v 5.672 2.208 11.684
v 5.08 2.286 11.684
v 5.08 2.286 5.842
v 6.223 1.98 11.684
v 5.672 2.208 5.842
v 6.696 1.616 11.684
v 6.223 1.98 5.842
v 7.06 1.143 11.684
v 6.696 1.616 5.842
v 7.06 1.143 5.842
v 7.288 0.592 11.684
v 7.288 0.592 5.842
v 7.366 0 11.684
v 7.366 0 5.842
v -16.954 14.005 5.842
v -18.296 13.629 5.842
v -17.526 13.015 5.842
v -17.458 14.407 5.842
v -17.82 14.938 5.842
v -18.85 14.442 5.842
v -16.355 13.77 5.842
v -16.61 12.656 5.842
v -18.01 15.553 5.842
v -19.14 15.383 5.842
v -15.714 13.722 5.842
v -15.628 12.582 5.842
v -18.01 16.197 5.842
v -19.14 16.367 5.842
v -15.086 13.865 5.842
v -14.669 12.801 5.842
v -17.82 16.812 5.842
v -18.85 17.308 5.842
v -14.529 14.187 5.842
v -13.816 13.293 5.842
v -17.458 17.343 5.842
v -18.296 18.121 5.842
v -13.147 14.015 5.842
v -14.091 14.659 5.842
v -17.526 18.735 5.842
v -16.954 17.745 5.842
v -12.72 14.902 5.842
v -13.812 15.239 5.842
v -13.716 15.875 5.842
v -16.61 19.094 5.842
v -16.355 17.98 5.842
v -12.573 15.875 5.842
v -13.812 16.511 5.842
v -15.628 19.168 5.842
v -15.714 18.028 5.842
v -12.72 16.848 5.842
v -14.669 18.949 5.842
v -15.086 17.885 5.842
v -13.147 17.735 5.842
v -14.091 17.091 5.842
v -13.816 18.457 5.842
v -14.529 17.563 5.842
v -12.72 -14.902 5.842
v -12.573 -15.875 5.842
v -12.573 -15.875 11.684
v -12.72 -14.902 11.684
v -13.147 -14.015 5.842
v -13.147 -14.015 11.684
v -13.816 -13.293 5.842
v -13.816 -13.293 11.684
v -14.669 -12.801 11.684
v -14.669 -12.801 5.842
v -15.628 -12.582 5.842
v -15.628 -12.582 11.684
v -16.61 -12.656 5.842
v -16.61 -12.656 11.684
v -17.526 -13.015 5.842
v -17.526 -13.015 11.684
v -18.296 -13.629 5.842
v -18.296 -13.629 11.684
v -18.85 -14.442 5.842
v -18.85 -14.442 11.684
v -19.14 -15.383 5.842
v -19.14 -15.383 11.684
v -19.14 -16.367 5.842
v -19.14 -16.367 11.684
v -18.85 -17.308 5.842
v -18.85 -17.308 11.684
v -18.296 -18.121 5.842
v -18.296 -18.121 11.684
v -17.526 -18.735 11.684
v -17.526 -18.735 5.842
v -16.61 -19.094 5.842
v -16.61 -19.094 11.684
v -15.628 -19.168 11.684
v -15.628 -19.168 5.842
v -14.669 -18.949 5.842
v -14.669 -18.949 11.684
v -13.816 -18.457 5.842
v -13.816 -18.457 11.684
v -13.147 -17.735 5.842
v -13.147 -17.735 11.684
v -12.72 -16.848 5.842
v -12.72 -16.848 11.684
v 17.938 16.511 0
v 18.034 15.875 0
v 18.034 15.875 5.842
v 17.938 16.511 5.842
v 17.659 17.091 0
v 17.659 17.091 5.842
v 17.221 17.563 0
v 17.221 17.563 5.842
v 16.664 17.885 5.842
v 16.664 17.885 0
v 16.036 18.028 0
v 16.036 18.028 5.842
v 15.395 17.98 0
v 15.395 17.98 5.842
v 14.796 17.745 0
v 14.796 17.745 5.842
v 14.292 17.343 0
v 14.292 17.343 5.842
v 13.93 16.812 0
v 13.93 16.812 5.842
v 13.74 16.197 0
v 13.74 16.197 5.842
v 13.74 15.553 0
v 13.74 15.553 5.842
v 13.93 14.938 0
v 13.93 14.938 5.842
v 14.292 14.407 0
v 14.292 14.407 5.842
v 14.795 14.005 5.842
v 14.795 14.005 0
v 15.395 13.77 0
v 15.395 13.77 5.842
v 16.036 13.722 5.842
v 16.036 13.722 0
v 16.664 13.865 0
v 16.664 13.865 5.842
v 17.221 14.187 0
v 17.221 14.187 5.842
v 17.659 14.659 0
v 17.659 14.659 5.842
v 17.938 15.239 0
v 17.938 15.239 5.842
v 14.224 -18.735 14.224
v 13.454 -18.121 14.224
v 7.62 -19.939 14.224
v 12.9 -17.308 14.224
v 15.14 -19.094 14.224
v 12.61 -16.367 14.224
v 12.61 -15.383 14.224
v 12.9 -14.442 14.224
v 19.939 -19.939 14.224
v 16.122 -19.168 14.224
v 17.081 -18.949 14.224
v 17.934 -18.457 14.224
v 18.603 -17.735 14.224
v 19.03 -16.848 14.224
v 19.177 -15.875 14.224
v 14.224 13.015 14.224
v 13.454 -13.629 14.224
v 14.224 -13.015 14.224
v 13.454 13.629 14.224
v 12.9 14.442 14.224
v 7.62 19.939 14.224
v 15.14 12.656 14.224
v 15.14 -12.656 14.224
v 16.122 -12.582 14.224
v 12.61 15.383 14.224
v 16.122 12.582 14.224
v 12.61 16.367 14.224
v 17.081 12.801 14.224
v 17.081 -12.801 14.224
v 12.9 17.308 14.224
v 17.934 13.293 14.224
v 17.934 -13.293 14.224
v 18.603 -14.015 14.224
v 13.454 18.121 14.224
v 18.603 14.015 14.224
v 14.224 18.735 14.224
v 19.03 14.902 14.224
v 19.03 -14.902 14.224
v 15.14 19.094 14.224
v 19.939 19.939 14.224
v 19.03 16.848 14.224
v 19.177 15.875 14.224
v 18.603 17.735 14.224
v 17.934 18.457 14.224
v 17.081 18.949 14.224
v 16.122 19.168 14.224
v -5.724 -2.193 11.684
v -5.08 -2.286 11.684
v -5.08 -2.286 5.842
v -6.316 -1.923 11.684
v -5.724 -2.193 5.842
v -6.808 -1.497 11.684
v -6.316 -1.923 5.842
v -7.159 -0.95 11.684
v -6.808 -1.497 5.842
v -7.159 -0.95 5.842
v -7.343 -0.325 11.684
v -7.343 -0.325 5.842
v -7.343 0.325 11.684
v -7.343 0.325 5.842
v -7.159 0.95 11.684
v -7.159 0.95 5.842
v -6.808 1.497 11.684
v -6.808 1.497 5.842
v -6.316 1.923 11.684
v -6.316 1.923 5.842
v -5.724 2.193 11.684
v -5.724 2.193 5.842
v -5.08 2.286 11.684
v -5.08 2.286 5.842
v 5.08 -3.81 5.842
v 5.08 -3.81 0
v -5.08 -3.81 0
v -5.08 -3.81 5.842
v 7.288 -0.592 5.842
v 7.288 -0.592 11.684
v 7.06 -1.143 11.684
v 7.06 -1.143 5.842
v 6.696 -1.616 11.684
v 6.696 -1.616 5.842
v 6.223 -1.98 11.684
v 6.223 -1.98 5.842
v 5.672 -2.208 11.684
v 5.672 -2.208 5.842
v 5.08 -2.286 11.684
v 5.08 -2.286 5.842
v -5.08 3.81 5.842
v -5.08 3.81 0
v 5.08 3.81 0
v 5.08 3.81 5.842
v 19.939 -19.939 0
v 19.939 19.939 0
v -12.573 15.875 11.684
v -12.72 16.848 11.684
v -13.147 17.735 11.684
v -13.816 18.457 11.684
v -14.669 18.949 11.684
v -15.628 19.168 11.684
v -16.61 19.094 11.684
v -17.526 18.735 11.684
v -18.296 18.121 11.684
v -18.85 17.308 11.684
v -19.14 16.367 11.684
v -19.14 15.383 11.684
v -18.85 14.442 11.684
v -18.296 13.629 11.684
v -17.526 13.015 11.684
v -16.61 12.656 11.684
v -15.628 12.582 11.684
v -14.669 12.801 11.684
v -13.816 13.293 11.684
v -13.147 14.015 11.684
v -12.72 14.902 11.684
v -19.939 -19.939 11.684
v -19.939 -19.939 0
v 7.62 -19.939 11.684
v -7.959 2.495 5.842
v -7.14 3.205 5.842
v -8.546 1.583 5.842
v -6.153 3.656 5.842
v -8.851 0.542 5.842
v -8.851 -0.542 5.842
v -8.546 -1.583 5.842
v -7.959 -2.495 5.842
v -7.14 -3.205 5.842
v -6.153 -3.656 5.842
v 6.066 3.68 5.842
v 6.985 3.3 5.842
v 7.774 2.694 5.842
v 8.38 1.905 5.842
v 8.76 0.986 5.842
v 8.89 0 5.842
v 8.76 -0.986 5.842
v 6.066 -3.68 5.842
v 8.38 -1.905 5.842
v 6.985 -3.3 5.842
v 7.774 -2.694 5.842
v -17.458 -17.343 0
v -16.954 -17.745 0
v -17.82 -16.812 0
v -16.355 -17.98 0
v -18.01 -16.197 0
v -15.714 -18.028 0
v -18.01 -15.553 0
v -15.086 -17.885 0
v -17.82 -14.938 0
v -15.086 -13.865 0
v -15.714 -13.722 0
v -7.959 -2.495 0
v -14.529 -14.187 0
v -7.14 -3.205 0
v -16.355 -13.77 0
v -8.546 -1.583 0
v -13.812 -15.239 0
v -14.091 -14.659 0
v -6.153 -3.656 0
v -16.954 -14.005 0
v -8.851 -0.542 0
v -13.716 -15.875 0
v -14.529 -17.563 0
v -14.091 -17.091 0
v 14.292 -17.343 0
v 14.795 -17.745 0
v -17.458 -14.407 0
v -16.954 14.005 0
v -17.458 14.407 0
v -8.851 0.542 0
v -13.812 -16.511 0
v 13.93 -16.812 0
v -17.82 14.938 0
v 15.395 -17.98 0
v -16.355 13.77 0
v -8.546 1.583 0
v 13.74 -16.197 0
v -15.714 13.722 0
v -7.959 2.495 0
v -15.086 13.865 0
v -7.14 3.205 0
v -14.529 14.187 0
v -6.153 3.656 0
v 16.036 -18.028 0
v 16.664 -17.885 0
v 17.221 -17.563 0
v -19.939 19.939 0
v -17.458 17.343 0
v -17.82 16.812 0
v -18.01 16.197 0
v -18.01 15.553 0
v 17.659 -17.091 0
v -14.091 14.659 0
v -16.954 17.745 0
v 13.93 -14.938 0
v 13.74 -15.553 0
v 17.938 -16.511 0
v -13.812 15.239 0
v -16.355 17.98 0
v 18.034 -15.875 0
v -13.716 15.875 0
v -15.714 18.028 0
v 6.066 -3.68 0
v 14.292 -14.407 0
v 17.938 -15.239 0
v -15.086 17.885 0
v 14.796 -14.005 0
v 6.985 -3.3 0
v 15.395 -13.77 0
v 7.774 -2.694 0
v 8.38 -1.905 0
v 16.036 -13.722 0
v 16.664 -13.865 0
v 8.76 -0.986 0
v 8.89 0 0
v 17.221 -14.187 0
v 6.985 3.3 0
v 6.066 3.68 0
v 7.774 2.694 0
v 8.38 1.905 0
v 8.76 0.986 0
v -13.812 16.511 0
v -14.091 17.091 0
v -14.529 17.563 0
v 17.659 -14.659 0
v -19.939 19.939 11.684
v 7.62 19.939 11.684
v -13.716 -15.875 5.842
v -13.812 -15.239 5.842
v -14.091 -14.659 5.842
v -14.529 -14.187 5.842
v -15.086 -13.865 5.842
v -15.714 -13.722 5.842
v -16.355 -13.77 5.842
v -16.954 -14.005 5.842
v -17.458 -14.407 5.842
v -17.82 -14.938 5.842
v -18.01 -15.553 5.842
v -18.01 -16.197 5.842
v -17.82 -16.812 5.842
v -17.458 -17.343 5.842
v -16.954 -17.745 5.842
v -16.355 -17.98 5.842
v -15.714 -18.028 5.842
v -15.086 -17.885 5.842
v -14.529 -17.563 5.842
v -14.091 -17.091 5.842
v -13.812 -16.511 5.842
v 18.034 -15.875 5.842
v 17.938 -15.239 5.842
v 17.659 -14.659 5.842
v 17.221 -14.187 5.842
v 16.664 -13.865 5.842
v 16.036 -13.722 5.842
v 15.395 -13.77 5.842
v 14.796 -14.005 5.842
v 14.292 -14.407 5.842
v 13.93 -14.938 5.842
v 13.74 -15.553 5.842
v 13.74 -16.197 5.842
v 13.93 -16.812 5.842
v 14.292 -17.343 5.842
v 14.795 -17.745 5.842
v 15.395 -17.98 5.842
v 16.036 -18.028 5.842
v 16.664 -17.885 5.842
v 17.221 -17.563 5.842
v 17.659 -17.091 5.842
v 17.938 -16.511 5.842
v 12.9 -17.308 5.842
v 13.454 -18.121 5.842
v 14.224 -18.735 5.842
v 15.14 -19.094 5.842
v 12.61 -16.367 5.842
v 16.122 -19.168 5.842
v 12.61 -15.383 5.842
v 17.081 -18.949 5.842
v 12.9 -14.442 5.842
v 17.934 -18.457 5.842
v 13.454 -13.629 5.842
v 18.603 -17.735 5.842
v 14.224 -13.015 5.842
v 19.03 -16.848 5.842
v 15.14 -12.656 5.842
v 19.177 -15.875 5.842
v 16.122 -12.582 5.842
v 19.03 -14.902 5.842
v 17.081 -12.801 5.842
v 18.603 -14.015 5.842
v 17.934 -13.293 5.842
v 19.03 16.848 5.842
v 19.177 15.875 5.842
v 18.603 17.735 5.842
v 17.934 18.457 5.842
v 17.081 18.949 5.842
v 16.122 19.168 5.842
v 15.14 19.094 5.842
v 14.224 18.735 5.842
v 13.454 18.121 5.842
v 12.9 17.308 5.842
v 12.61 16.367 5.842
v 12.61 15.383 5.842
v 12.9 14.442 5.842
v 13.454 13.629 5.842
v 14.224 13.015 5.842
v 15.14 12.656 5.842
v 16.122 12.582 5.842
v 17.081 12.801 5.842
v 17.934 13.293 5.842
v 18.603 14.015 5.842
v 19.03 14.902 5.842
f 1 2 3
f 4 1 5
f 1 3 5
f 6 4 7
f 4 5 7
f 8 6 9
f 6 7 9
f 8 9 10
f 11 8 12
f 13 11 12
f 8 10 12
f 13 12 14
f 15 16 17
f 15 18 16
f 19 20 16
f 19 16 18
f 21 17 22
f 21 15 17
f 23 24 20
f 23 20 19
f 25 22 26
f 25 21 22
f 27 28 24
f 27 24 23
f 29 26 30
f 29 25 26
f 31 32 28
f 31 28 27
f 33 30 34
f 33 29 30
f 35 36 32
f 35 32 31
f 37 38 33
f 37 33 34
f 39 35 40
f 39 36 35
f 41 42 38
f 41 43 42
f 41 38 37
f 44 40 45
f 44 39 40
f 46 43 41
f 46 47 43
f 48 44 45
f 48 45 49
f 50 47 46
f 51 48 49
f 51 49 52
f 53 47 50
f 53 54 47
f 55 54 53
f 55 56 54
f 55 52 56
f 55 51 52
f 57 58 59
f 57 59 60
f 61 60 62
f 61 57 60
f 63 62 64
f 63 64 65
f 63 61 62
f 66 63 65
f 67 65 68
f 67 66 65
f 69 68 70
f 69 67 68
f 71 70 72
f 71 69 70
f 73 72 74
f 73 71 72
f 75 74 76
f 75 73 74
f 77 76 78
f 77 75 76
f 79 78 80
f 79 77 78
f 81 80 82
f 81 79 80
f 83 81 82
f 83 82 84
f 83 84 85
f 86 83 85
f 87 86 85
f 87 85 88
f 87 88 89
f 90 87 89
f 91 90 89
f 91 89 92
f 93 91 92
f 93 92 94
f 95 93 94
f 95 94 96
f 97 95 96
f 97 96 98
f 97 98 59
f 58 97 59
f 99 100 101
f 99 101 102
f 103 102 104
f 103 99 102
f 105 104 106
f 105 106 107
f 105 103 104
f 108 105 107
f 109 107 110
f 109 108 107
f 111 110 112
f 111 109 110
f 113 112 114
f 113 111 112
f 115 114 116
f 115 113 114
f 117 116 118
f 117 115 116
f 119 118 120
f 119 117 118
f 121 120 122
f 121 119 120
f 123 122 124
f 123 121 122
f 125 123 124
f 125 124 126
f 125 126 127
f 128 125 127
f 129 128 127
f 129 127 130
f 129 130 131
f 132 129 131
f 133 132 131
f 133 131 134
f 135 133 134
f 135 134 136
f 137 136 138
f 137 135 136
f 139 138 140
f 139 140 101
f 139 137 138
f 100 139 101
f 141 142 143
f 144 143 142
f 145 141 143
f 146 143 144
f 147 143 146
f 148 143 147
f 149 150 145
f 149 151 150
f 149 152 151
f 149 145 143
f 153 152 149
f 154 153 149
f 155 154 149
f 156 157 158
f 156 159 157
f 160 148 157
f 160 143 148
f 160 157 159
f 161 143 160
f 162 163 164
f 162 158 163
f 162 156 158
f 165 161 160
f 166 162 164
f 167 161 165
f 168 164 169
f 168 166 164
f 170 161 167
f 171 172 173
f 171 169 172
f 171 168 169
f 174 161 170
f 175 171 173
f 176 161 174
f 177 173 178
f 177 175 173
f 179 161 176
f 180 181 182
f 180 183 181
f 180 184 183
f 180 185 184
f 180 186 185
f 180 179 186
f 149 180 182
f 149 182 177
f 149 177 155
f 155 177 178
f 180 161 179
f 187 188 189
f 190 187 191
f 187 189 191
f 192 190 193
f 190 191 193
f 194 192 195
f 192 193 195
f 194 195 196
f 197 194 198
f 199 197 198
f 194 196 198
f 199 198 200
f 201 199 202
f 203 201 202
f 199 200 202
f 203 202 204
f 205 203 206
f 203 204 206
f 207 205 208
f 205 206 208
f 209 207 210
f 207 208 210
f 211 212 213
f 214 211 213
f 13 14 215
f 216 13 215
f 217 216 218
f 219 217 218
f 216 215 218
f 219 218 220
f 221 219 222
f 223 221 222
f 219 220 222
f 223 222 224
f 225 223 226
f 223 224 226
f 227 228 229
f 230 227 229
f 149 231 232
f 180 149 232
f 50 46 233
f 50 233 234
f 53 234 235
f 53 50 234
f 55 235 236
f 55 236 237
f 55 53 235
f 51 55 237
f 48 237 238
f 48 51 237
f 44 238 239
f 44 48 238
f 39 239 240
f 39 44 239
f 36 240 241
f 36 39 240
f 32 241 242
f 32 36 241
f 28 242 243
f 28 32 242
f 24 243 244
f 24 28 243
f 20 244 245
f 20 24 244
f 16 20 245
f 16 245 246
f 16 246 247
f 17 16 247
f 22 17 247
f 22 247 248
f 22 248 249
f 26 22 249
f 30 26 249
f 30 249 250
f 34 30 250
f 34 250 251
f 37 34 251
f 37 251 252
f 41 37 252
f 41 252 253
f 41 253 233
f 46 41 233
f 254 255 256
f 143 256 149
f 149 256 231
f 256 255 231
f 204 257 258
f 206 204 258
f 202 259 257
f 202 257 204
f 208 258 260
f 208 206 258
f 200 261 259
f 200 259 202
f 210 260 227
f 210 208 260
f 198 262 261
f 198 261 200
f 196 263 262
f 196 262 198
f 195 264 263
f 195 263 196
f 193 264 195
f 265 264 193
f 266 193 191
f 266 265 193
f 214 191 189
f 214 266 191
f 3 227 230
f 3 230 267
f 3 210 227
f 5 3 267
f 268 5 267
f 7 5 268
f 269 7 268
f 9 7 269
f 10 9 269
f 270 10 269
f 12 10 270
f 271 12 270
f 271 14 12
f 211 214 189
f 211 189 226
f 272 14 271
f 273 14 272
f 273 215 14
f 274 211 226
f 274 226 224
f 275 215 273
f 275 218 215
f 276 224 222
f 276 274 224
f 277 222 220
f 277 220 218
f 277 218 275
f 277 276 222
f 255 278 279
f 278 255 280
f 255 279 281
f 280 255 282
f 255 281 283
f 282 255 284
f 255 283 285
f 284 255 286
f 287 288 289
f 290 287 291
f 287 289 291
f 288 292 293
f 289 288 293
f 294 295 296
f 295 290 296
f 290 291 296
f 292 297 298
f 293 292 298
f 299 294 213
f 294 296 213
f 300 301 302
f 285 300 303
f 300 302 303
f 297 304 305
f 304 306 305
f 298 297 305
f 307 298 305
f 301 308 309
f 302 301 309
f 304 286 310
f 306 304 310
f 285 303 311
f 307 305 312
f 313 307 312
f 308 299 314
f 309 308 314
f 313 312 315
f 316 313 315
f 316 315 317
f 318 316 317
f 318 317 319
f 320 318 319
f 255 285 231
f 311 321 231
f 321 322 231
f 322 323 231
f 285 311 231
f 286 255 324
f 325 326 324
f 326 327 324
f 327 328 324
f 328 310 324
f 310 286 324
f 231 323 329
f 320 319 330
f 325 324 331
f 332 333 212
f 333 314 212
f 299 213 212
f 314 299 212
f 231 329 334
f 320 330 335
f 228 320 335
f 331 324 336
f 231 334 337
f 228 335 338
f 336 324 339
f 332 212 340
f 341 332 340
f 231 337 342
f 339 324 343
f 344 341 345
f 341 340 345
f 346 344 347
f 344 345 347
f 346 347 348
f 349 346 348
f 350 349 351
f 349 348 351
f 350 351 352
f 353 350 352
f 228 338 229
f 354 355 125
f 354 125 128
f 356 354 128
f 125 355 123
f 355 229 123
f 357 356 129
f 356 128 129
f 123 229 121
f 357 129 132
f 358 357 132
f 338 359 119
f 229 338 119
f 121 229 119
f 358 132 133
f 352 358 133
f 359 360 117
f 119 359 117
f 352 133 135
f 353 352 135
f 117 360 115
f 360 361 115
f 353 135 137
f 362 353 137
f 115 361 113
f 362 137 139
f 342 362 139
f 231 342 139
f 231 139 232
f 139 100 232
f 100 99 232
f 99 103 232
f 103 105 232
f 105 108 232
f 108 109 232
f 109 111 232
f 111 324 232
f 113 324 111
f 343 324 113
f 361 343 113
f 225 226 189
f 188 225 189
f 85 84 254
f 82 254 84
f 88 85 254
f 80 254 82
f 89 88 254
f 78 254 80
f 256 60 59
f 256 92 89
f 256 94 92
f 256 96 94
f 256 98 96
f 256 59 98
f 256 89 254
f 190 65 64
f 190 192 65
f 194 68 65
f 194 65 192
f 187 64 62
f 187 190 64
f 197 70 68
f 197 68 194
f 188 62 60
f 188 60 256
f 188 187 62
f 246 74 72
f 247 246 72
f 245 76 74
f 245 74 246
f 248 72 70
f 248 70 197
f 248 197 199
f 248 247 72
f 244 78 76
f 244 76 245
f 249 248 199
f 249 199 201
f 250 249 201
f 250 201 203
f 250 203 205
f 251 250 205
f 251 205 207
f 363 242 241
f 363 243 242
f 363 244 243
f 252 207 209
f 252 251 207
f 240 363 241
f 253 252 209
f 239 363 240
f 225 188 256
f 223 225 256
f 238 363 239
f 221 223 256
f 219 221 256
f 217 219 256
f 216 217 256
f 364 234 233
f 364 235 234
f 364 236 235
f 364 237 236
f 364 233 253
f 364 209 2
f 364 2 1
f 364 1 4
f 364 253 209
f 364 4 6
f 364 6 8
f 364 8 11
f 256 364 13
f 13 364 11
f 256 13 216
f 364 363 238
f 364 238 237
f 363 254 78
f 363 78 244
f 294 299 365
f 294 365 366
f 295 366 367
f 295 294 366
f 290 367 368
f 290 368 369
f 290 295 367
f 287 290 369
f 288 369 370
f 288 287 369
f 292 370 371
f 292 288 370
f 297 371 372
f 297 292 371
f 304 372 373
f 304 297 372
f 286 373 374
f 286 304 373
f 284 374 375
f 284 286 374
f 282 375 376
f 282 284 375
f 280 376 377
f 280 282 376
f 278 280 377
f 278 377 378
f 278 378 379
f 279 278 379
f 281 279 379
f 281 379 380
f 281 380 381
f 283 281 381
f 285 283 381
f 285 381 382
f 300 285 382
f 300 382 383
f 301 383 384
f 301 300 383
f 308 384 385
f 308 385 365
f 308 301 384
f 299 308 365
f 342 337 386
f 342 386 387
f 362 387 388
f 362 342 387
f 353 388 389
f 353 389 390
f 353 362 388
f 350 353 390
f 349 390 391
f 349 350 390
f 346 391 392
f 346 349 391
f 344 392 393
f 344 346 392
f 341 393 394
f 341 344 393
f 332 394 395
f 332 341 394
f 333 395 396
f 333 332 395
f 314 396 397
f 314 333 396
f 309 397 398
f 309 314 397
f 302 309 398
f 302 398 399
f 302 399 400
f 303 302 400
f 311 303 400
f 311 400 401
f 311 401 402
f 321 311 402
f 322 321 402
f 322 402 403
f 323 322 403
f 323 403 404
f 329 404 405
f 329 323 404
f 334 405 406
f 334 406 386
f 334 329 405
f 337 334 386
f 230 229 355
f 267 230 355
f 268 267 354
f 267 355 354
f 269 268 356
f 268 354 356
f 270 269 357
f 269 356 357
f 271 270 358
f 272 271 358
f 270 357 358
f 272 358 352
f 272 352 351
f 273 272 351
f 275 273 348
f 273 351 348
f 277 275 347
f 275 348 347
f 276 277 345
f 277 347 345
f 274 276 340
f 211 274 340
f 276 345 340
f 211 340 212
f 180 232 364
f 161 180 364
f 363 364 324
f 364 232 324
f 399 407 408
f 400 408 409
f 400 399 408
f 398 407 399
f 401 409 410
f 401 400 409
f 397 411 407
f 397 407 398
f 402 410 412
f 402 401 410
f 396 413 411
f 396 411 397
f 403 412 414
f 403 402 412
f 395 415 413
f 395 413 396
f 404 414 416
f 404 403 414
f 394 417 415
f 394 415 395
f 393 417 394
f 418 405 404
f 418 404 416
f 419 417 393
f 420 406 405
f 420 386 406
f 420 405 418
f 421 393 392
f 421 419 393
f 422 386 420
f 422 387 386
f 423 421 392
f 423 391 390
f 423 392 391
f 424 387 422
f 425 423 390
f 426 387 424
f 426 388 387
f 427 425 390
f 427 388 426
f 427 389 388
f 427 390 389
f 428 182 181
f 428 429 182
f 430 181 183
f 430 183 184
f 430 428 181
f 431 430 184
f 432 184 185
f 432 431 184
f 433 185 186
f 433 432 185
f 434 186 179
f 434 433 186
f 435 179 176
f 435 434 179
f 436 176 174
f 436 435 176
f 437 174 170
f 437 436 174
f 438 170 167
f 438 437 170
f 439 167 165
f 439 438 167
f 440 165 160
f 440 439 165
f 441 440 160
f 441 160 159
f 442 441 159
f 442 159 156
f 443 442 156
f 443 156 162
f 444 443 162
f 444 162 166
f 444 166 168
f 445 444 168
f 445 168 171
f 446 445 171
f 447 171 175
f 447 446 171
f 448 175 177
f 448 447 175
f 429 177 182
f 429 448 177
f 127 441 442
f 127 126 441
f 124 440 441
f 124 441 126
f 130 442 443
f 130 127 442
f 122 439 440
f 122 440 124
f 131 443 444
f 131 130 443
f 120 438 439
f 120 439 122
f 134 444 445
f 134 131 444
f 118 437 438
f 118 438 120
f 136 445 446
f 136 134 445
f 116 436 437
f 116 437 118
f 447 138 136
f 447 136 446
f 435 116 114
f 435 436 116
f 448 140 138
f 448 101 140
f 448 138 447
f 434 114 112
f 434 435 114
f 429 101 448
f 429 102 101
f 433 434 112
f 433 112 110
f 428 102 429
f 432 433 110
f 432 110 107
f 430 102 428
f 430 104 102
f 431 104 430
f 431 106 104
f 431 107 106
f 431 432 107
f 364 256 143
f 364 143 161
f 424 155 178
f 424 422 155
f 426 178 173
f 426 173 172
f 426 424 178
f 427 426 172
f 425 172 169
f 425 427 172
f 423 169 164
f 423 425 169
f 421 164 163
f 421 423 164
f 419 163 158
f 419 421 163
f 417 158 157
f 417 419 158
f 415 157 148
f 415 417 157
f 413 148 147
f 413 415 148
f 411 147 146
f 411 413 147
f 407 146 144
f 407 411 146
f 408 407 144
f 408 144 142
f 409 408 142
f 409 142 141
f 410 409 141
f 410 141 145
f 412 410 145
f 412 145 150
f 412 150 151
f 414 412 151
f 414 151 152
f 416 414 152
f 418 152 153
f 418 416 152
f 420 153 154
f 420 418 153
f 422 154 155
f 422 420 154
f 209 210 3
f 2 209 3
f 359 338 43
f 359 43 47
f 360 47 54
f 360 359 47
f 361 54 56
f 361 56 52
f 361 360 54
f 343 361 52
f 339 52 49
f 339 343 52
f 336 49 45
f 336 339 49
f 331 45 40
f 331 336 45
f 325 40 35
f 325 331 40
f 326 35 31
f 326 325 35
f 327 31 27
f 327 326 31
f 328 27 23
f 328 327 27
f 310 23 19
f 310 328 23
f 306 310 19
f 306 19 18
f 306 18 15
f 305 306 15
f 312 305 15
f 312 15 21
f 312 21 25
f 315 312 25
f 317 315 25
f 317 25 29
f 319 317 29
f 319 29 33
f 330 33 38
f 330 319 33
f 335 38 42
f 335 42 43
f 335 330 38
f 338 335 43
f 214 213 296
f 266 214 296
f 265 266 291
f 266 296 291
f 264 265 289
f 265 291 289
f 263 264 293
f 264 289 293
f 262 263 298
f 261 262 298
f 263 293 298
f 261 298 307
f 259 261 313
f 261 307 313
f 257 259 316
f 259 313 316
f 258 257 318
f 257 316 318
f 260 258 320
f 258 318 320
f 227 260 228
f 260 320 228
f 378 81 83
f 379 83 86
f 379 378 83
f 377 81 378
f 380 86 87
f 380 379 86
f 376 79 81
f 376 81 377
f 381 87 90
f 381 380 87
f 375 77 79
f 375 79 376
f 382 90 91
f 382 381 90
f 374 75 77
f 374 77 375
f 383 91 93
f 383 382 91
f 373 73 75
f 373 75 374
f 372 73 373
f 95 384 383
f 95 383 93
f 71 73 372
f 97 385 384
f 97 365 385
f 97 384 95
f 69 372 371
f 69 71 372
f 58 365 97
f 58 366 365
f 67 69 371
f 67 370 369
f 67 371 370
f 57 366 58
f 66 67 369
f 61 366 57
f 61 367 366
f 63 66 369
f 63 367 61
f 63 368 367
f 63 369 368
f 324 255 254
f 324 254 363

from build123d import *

# Parameters (mm, degrees)
F0_W     = 12.319
F0_H     = 39.878
F0_R     = 3.302
F0_W_2   = 27.559
F1_DEPTH = 11.684
F0_R_2   = 2.159
F2_DEPTH = 5.842
F3_DEPTH = 14.224
F5_DEPTH = 25.4
F6_DEPTH = 5.842


# Not quite as in the source:
# - a feature names something its author has since deleted; it is built from what else it names


with BuildPart() as f1:
    # F0 (on Top) → F1 (new body)
    with BuildSketch(Plane.XY):
        with Locations((13.7795, 0)):
            Rectangle(F0_W, F0_H)
        with Locations((15.875, -15.875)):
            Circle(F0_R, mode=Mode.SUBTRACT)
        with Locations((15.875, 15.875)):
            Circle(F0_R, mode=Mode.SUBTRACT)
        with Locations((-6.1595, 0)):
            Rectangle(F0_W_2, F0_H)
        with Locations((-15.875, -15.875)):
            Circle(F0_R, mode=Mode.SUBTRACT)
        with Locations((-15.875, 15.875)):
            Circle(F0_R, mode=Mode.SUBTRACT)
    extrude(amount=F1_DEPTH)

    # F0 (on Top) → F2 (join)
    with BuildSketch(Plane.XY):
        with Locations((-15.875, 15.875)):
            Circle(F0_R)
        with Locations((-15.875, 15.875)):
            Circle(F0_R_2, mode=Mode.SUBTRACT)
        with Locations((15.875, 15.875)):
            Circle(F0_R)
        with Locations((15.875, 15.875)):
            Circle(F0_R_2, mode=Mode.SUBTRACT)
        with Locations((15.875, -15.875)):
            Circle(F0_R)
        with Locations((15.875, -15.875)):
            Circle(F0_R_2, mode=Mode.SUBTRACT)
        with Locations((-15.875, -15.875)):
            Circle(F0_R)
        with Locations((-15.875, -15.875)):
            Circle(F0_R_2, mode=Mode.SUBTRACT)
    extrude(amount=F2_DEPTH)

    # F0 (on Top) → F3 (join)
    with BuildSketch(Plane.XY):
        with Locations((13.7795, 0)):
            Rectangle(F0_W, F0_H)
        with Locations((15.875, -15.875)):
            Circle(F0_R, mode=Mode.SUBTRACT)
        with Locations((15.875, 15.875)):
            Circle(F0_R, mode=Mode.SUBTRACT)
    extrude(amount=F3_DEPTH)

    # F4 (on face) → F5 (cut)
    with BuildSketch(Plane(origin=(0, 0, 0), x_dir=(1, 0, 0), z_dir=(0, 0, -1))):
        with BuildLine():
            ThreePointArc((-2.794, 0), (-3.4635538982, 1.6164461018), (-5.08, 2.286))
            ThreePointArc((-5.08, 2.286), (-7.366, 0), (-5.08, -2.286))
            ThreePointArc((-5.08, -2.286), (-3.4635538982, -1.6164461018), (-2.794, 0))
        make_face()
        with BuildLine():
            ThreePointArc((7.366, 0), (6.6964461018, 1.6164461018), (5.08, 2.286))
            ThreePointArc((5.08, 2.286), (2.794, 0), (5.08, -2.286))
            ThreePointArc((5.08, -2.286), (6.6964461018, -1.6164461018), (7.366, 0))
        make_face()
        with BuildLine():
            ThreePointArc((-1.27, 0), (-1.4655166344, 1.2048277885), (-2.032, 2.286))
            Line((-2.032, 2.286), (-5.08, 2.286))
            ThreePointArc((-5.08, 2.286), (-3.4635538982, 1.6164461018), (-2.794, 0))
            ThreePointArc((-2.794, 0), (-3.4635538982, -1.6164461018), (-5.08, -2.286))
            Line((-5.08, -2.286), (-2.032, -2.286))
            ThreePointArc((-2.032, -2.286), (-1.4655166344, -1.2048277885), (-1.27, 0))
        make_face()
        with BuildLine():
            ThreePointArc((2.032, -2.286), (1.27, 0), (2.032, 2.286))
            Line((2.032, 2.286), (-2.032, 2.286))
            ThreePointArc((-2.032, 2.286), (-1.4655166344, 1.2048277885), (-1.27, 0))
            ThreePointArc((-1.27, 0), (-1.4655166344, -1.2048277885), (-2.032, -2.286))
            Line((-2.032, -2.286), (2.032, -2.286))
        make_face()
        with BuildLine():
            Line((5.08, 2.286), (2.032, 2.286))
            ThreePointArc((2.032, 2.286), (1.27, 0), (2.032, -2.286))
            Line((2.032, -2.286), (5.08, -2.286))
            ThreePointArc((5.08, -2.286), (2.794, 0), (5.08, 2.286))
        make_face()
    extrude(amount=-F5_DEPTH, mode=Mode.SUBTRACT)

    # F4 (on face) → F6 (cut)
    with BuildSketch(Plane(origin=(0, 0, 0), x_dir=(1, 0, 0), z_dir=(0, 0, -1))):
        with BuildLine():
            ThreePointArc((-1.27, 0), (-1.4655166344, 1.2048277885), (-2.032, 2.286))
            Line((-2.032, 2.286), (-5.08, 2.286))
            ThreePointArc((-5.08, 2.286), (-3.4635538982, 1.6164461018), (-2.794, 0))
            ThreePointArc((-2.794, 0), (-3.4635538982, -1.6164461018), (-5.08, -2.286))
            Line((-5.08, -2.286), (-2.032, -2.286))
            ThreePointArc((-2.032, -2.286), (-1.4655166344, -1.2048277885), (-1.27, 0))
        make_face()
        with BuildLine():
            ThreePointArc((-2.032, 2.286), (-3.3761162011, 3.4077675977), (-5.08, 3.81))
            ThreePointArc((-5.08, 3.81), (-8.89, 0), (-5.08, -3.81))
            ThreePointArc((-5.08, -3.81), (-3.3761162011, -3.4077675977), (-2.032, -2.286))
            Line((-2.032, -2.286), (-5.08, -2.286))
            ThreePointArc((-5.08, -2.286), (-7.366, 0), (-5.08, 2.286))
            Line((-5.08, 2.286), (-2.032, 2.286))
        make_face()
        with BuildLine():
            ThreePointArc((2.032, 2.286), (3.3761162011, 3.4077675977), (5.08, 3.81))
            Line((5.08, 3.81), (-5.08, 3.81))
            ThreePointArc((-5.08, 3.81), (-3.3761162011, 3.4077675977), (-2.032, 2.286))
            Line((-2.032, 2.286), (2.032, 2.286))
        make_face()
        with BuildLine():
            ThreePointArc((2.032, -2.286), (1.27, 0), (2.032, 2.286))
            Line((2.032, 2.286), (-2.032, 2.286))
            ThreePointArc((-2.032, 2.286), (-1.4655166344, 1.2048277885), (-1.27, 0))
            ThreePointArc((-1.27, 0), (-1.4655166344, -1.2048277885), (-2.032, -2.286))
            Line((-2.032, -2.286), (2.032, -2.286))
        make_face()
        with BuildLine():
            Line((5.08, 2.286), (2.032, 2.286))
            ThreePointArc((2.032, 2.286), (1.27, 0), (2.032, -2.286))
            Line((2.032, -2.286), (5.08, -2.286))
            ThreePointArc((5.08, -2.286), (2.794, 0), (5.08, 2.286))
        make_face()
        with BuildLine():
            ThreePointArc((5.08, -3.81), (7.7740768363, -2.6940768363), (8.89, 0))
            ThreePointArc((8.89, 0), (7.7740768363, 2.6940768363), (5.08, 3.81))
            ThreePointArc((5.08, 3.81), (3.3761162011, 3.4077675977), (2.032, 2.286))
            Line((2.032, 2.286), (5.08, 2.286))
            ThreePointArc((5.08, 2.286), (6.6964461018, 1.6164461018), (7.366, 0))
            ThreePointArc((7.366, 0), (6.6964461018, -1.6164461018), (5.08, -2.286))
            Line((5.08, -2.286), (2.032, -2.286))
            ThreePointArc((2.032, -2.286), (3.3761162011, -3.4077675977), (5.08, -3.81))
        make_face()
        with BuildLine():
            Line((-5.08, -3.81), (5.08, -3.81))
            ThreePointArc((5.08, -3.81), (3.3761162011, -3.4077675977), (2.032, -2.286))
            Line((2.032, -2.286), (-2.032, -2.286))
            ThreePointArc((-2.032, -2.286), (-3.3761162011, -3.4077675977), (-5.08, -3.81))
        make_face()
    extrude(amount=-F6_DEPTH, mode=Mode.SUBTRACT)


solid = f1.part
